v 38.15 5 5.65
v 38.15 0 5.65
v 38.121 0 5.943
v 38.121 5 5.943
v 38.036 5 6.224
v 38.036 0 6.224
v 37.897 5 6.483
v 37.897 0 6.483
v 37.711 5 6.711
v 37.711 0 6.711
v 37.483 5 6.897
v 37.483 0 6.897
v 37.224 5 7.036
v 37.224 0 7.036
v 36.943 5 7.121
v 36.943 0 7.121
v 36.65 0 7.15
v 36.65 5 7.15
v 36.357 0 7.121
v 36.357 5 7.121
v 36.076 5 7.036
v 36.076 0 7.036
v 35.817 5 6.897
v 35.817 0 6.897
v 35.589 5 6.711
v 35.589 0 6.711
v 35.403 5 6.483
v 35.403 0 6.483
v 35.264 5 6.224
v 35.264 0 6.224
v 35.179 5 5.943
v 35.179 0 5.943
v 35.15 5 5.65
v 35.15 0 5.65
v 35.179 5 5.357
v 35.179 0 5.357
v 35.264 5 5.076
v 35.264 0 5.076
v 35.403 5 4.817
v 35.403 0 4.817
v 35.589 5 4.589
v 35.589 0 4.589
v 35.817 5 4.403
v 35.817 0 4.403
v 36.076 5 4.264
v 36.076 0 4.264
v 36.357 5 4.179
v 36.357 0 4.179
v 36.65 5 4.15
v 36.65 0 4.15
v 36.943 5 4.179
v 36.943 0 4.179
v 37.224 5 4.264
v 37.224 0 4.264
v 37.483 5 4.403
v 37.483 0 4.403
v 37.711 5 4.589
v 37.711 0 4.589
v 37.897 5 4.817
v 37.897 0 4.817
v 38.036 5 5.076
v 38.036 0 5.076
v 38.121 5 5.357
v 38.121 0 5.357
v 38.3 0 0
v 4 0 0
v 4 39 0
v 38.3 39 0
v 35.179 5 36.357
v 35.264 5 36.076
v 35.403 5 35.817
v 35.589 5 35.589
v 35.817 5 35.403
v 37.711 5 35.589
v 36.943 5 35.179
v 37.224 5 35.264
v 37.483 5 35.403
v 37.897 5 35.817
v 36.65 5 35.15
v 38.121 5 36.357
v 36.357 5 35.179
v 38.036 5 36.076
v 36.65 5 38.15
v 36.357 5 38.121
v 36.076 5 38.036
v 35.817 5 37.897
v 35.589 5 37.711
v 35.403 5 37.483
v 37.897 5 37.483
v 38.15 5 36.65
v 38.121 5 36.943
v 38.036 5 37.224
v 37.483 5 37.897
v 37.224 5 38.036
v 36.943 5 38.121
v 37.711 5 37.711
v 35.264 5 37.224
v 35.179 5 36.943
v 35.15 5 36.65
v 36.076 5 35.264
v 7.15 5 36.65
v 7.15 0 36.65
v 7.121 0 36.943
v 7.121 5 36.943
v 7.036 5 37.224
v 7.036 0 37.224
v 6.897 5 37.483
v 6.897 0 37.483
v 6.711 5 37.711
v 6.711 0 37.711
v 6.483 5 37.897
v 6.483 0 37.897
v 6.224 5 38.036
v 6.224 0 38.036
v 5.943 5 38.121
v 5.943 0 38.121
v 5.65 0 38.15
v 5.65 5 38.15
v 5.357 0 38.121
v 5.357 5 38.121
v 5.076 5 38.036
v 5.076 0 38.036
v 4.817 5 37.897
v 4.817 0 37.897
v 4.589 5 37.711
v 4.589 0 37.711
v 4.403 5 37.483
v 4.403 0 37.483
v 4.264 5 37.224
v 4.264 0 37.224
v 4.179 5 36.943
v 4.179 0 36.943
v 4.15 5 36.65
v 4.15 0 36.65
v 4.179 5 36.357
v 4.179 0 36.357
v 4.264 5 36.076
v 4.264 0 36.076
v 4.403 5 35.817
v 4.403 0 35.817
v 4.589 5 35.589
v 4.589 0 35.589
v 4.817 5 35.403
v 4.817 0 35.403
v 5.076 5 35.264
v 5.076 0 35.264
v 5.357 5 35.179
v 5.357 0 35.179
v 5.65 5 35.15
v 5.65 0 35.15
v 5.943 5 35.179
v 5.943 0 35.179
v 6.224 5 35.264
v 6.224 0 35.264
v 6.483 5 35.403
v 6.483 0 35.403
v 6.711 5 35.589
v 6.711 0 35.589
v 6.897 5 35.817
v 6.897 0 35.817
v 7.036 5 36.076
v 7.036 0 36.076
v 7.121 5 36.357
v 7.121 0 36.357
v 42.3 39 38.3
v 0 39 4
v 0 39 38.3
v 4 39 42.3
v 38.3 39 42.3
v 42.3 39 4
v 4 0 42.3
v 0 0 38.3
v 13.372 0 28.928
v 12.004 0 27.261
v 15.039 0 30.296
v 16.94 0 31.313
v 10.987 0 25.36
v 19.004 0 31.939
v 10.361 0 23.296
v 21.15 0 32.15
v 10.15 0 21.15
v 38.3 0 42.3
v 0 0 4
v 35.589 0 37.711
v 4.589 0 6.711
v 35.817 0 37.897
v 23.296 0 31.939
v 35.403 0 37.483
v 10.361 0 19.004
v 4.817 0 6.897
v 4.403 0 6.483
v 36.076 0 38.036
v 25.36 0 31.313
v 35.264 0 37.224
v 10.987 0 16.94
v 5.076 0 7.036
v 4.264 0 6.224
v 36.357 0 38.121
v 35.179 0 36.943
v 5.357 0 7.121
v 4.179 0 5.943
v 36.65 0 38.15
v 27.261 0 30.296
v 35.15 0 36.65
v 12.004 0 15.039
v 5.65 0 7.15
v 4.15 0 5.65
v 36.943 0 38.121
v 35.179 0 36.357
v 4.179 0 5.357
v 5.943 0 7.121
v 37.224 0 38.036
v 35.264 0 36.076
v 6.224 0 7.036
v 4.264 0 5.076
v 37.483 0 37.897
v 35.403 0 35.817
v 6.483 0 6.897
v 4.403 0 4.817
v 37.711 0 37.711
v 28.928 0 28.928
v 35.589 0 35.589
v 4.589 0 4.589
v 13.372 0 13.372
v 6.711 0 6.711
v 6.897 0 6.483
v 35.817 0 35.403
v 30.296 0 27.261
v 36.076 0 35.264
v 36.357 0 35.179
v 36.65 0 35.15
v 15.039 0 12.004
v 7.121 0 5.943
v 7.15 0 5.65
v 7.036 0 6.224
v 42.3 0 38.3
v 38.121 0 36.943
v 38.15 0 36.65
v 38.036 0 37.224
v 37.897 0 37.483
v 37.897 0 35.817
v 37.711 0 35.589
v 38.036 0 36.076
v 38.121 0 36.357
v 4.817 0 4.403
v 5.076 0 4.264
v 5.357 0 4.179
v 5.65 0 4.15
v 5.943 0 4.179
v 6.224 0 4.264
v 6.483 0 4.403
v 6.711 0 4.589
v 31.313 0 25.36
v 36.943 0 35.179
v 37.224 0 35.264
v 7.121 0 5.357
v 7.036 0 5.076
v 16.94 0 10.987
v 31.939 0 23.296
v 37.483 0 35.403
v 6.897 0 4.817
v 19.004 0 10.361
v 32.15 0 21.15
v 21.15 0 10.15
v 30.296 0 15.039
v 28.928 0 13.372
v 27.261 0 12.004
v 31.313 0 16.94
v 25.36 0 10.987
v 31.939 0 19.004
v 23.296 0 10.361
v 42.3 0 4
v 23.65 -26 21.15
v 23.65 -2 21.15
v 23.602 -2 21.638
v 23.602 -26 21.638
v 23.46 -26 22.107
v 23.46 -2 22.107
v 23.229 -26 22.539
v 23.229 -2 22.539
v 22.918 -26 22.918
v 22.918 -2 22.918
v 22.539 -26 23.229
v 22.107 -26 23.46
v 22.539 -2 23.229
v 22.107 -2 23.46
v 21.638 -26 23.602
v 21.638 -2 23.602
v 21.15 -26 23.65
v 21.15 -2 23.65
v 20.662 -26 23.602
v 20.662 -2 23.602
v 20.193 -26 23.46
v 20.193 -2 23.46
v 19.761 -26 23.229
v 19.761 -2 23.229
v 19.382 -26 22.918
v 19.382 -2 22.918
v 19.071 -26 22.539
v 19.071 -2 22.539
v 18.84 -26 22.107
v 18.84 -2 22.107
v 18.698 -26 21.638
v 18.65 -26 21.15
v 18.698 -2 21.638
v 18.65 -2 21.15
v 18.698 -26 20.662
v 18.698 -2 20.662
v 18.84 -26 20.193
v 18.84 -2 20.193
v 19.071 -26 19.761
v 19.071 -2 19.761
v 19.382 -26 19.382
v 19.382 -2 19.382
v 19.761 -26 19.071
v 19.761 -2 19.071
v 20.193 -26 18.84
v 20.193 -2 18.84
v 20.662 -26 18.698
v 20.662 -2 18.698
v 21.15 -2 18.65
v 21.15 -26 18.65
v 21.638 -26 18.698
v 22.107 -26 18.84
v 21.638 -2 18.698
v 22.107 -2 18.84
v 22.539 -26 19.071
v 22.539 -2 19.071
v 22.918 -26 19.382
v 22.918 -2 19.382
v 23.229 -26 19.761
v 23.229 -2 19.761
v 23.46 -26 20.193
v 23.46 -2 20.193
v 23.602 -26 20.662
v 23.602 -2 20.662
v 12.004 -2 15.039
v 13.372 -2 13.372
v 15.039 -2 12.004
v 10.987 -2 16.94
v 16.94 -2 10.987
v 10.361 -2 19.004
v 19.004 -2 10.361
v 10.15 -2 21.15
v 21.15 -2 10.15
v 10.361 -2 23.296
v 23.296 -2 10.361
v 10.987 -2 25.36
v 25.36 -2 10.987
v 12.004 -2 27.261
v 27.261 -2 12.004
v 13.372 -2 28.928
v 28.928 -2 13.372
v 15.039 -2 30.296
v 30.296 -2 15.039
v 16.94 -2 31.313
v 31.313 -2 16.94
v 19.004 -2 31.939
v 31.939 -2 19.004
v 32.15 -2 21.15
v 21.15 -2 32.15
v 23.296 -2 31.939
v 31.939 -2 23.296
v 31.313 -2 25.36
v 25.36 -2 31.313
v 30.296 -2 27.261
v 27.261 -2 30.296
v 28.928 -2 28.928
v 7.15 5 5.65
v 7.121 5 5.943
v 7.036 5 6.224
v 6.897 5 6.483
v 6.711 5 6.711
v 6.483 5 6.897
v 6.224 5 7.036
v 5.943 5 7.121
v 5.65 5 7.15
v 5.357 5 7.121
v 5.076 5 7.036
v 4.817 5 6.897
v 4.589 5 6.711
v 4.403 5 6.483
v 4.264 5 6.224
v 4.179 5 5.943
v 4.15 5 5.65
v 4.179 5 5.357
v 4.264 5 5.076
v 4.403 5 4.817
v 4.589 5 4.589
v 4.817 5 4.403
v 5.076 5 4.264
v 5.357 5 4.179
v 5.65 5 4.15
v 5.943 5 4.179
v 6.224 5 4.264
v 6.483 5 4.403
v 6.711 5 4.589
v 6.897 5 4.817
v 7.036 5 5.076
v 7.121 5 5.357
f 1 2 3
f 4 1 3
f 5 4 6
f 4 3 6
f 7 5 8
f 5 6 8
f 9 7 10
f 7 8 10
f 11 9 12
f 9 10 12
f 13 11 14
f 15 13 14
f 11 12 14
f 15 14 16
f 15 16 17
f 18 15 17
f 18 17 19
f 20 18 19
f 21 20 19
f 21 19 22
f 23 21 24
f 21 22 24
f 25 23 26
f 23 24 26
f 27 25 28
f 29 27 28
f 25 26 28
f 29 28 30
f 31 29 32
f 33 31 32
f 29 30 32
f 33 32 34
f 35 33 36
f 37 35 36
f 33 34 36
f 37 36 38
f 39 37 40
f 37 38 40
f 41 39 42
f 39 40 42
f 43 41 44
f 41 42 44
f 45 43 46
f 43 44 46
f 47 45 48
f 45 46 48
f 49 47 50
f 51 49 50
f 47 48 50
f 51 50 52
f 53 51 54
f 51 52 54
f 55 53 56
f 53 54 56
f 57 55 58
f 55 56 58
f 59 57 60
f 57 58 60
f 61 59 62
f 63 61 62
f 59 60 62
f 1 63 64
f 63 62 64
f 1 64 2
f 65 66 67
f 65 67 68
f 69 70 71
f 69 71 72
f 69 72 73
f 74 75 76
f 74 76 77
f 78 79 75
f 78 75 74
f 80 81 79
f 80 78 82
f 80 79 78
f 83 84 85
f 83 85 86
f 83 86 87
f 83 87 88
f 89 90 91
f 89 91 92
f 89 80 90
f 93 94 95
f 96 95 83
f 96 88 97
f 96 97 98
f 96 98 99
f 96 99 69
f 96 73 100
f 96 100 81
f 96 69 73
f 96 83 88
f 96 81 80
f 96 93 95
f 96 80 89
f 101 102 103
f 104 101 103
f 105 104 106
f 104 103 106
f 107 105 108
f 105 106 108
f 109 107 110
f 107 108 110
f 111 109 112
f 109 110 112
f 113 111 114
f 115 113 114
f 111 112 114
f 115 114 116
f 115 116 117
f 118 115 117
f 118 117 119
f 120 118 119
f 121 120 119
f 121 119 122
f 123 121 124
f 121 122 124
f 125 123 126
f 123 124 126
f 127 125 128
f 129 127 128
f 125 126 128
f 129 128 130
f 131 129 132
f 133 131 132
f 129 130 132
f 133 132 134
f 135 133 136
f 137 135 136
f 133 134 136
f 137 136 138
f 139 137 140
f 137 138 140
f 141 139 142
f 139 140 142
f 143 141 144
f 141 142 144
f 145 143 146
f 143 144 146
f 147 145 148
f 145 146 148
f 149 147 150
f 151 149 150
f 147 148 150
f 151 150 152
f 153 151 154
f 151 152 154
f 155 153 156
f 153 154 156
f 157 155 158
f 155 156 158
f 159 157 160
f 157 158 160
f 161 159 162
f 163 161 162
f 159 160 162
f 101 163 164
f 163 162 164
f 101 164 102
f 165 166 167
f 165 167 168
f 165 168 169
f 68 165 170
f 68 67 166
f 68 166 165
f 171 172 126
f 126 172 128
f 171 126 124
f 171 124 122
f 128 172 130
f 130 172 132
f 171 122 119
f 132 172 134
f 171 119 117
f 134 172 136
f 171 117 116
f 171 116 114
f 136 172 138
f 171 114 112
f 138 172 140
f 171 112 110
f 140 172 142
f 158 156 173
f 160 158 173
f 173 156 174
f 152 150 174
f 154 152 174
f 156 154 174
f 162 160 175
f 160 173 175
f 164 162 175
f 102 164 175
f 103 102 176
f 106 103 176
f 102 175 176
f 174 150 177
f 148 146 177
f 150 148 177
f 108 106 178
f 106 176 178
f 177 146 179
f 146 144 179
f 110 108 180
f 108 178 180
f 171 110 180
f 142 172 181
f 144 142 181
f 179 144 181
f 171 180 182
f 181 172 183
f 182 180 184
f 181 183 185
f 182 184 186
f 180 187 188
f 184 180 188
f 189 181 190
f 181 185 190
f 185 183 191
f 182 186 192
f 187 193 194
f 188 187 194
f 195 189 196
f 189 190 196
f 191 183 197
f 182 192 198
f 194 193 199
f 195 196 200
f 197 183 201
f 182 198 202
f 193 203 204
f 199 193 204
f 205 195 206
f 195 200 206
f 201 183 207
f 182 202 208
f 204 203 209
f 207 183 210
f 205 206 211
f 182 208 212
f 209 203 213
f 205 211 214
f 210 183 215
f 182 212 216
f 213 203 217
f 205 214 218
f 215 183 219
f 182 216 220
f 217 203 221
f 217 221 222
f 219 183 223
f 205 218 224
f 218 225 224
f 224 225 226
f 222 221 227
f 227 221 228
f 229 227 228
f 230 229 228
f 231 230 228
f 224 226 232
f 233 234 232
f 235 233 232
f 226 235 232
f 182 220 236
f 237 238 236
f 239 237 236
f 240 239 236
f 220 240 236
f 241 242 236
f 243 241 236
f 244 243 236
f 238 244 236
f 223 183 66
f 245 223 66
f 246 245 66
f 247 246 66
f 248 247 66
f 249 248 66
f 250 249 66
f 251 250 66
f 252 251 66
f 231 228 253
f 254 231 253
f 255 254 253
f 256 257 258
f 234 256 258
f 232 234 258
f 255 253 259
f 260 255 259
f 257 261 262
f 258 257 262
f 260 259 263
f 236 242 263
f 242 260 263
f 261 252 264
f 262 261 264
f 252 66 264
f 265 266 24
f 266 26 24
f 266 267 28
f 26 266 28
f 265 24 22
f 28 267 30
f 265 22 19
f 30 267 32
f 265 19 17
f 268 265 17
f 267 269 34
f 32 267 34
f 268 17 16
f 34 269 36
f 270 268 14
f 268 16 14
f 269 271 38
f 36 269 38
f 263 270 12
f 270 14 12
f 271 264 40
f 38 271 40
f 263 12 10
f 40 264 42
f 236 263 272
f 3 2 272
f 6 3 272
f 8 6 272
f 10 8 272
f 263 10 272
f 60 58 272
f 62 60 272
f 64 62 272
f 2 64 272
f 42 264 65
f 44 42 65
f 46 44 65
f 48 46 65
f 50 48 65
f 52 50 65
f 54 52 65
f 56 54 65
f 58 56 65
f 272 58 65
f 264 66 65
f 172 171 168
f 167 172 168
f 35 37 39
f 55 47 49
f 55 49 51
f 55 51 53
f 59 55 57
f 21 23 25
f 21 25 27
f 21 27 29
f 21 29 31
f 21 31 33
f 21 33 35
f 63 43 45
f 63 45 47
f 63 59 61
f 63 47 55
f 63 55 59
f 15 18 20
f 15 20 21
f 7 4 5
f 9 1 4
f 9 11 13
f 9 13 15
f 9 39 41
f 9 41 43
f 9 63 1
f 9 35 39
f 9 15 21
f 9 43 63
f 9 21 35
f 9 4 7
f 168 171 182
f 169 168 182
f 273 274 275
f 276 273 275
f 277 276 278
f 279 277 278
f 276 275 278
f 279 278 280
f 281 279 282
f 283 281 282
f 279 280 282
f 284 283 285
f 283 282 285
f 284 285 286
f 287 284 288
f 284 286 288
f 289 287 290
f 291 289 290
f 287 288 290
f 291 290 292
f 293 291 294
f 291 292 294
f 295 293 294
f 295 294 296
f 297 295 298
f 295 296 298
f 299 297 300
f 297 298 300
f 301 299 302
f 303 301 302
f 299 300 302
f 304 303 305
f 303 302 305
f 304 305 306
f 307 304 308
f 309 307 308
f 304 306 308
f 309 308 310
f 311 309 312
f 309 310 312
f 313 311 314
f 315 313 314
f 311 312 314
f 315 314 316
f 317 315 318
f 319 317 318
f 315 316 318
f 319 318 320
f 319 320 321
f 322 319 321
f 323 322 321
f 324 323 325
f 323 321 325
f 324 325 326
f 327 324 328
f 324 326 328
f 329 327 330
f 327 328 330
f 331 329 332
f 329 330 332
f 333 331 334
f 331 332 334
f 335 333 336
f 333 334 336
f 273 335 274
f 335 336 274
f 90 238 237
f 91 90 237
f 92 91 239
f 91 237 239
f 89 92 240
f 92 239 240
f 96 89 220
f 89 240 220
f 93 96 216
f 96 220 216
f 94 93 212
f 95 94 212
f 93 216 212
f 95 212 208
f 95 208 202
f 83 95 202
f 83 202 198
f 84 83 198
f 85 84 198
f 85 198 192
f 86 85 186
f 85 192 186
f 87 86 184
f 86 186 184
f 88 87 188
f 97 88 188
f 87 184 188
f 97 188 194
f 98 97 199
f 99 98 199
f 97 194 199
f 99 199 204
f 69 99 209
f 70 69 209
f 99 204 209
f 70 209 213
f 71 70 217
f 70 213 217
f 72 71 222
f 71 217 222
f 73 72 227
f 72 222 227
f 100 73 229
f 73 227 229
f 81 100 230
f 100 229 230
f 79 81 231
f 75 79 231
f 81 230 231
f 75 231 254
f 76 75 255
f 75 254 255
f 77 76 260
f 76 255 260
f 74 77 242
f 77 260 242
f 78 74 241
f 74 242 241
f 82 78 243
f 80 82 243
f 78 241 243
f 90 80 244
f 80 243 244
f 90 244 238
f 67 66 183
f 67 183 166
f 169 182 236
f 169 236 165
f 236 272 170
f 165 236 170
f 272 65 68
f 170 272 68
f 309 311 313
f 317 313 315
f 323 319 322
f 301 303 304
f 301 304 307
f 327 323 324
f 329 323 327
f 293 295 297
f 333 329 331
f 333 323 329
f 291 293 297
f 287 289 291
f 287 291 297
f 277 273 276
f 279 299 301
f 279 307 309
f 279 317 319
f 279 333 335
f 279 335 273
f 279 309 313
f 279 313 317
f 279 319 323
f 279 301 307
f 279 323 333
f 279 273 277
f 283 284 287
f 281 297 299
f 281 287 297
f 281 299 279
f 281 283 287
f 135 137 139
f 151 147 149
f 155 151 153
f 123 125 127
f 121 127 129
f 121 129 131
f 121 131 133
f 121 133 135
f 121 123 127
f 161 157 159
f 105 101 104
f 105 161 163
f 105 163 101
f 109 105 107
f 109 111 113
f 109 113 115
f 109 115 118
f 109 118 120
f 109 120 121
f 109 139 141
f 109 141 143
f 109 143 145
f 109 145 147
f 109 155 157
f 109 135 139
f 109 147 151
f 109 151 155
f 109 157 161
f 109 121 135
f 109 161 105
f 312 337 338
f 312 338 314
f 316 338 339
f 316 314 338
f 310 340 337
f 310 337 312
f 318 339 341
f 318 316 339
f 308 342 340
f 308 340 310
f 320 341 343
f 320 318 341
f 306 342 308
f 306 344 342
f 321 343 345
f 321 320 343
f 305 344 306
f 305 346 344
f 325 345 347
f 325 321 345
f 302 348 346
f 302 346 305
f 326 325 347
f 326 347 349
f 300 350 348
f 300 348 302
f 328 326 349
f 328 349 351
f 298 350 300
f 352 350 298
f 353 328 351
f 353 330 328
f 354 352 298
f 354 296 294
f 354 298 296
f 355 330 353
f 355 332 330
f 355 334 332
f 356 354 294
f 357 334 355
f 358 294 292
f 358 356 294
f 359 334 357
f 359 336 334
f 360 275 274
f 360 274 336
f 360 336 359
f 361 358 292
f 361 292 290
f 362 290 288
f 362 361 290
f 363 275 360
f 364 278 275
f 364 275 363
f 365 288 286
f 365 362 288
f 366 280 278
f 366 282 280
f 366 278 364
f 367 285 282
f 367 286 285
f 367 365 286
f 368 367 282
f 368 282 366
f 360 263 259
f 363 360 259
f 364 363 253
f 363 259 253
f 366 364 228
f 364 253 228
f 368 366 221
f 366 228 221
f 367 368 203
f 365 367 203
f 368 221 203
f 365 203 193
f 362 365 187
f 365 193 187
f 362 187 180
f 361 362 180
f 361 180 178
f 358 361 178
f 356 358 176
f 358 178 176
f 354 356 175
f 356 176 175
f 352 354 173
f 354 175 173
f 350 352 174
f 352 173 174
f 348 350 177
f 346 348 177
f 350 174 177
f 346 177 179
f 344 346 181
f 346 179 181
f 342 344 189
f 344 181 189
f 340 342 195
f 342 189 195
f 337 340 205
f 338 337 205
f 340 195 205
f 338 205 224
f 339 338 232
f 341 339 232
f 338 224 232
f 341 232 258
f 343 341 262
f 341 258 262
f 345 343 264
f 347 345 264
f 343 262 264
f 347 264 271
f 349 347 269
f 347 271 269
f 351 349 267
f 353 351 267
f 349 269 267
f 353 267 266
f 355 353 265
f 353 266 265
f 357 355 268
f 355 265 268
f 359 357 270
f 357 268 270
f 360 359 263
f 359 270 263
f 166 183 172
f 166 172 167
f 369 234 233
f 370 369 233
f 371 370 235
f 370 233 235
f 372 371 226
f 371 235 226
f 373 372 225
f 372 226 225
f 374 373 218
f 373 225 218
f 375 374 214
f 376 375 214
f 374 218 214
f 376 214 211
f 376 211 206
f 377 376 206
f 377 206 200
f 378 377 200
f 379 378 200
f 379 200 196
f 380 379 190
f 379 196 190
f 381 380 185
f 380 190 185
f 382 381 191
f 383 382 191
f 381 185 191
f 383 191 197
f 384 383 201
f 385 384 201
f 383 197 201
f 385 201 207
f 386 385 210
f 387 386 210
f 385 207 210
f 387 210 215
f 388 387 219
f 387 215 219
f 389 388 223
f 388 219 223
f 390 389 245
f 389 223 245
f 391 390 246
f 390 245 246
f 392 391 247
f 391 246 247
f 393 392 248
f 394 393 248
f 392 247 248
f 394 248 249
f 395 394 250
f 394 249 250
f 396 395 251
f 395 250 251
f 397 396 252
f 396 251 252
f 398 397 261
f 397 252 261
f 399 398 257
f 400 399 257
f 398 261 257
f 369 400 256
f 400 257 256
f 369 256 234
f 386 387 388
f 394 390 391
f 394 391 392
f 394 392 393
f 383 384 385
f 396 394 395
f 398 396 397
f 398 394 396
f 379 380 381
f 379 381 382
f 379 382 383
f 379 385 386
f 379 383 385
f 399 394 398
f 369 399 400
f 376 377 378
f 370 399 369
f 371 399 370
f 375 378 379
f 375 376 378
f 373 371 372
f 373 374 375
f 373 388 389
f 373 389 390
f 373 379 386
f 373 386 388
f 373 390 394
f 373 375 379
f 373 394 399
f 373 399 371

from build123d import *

# Parameters (mm, degrees)
BOX_W        = 42.3
BOX_H        = 39
BOX_DEPTH    = 42.3
CHAMFER_SIZE = 4
SKETCH002_R  = 1.5
POCKET_DEPTH = 5
SKETCH001_R  = 11
PAD001_DEPTH = 2
SKETCH_R     = 2.5
PAD_DEPTH    = 24


with BuildPart() as part:
    # Box → Box (new body)
    with BuildSketch(Plane.XY):
        with Locations((21.15, 19.5)):
            Rectangle(BOX_W, BOX_H)
    extrude(amount=BOX_DEPTH)

    # Chamfer
    chamfer_edges = [part.edges().sort_by_distance(p)[0] for p in [
        (42.3, 19.5, 0),
        (42.3, 19.5, 42.3),
        (0, 19.5, 42.3),
        (0, 19.5, 0),
    ]]
    chamfer(chamfer_edges, length=CHAMFER_SIZE)

    # Sketch002 → Pocket (cut)
    with BuildSketch(Plane.XZ):
        with Locations((5.65, 36.65)):
            Circle(SKETCH002_R)
        with Locations((36.65, 36.65)):
            Circle(SKETCH002_R)
        with Locations((5.65, 5.65)):
            Circle(SKETCH002_R)
        with Locations((36.65, 5.65)):
            Circle(SKETCH002_R)
    extrude(amount=-POCKET_DEPTH, mode=Mode.SUBTRACT)

    # Sketch001 → Pad001 (new body)
    with BuildSketch(Plane.XZ):
        with Locations((21.15, 21.15)):
            Circle(SKETCH001_R)
    extrude(amount=PAD001_DEPTH)

    # Sketch → Pad (new body)
    with BuildSketch(Plane.XZ.offset(2)):
        with Locations((21.15, 21.15)):
            Circle(SKETCH_R)
    extrude(amount=PAD_DEPTH)


solid = part.part
